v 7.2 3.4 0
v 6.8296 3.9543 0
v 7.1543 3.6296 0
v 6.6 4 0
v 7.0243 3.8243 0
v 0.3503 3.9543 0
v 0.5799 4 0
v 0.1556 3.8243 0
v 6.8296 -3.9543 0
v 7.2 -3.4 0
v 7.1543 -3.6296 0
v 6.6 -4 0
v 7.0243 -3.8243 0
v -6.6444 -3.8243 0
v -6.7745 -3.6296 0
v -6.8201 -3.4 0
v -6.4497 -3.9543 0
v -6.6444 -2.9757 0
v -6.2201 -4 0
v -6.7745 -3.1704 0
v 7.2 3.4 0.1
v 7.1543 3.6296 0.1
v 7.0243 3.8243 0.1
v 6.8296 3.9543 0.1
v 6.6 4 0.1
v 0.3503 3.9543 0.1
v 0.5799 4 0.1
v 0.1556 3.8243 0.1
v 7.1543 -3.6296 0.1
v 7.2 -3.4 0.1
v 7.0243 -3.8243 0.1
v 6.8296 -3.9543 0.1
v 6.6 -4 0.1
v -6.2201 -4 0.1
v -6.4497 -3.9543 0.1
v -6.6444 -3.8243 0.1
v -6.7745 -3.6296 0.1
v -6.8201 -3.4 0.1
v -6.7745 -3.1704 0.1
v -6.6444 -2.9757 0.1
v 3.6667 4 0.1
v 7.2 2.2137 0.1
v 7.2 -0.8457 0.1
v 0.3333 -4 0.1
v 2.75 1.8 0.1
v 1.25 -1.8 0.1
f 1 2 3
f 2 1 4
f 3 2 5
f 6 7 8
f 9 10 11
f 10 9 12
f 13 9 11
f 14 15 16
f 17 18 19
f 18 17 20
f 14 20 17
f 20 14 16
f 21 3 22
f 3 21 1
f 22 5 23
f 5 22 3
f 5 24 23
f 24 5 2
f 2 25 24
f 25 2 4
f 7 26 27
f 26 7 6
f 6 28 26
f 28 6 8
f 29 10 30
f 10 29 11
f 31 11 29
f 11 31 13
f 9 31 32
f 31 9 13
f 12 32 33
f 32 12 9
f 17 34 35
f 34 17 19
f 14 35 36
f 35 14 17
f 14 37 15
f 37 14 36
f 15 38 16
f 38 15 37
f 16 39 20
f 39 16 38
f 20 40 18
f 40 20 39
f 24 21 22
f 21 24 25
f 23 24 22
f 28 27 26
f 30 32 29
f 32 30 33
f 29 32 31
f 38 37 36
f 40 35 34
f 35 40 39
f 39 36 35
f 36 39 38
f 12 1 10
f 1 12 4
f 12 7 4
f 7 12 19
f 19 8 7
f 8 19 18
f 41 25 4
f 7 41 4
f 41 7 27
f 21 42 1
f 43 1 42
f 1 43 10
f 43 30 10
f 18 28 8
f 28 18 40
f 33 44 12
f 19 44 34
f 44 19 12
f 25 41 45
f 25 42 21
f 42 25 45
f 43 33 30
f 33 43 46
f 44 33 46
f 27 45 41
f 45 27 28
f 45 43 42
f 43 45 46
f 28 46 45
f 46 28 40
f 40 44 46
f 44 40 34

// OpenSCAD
// file: ../p/3-8cyli.scad
use <../lib.scad>
function ldraw_lib__3_8cyli() = [
// 0 Cylinder 0.375
// 0 Name: 3-8cyli.dat
// 0 Author: James Jessiman
// 0 !LDRAW_ORG Primitive UPDATE 2005-01
// 0 !LICENSE Licensed under CC BY 4.0 : see CAreadme.txt
// 
// 0 BFC CERTIFY CCW
  [0,"BFC","CERTIFY"],
  [0,"BFC","CCW"],
// 
// 0 !HISTORY 2002-05-08 [OrionP] Made BFC compliant
// 0 !HISTORY 2002-08-18 [PTadmin] Official Update 2002-04
// 0 !HISTORY 2004-12-11 [nielsk] Recreated using Primitive Generator, Edge lines fixed, BFC changed to CCW
// 0 !HISTORY 2005-12-28 [PTadmin] Official Update 2005-01
// 0 !HISTORY 2007-06-24 [PTadmin] Header formatted for Contributor Agreement
// 0 !HISTORY 2008-07-01 [PTadmin] Official Update 2008-01
// 
// 
// 4 16 .9239 1 .3827 .9239 0 .3827 1 0 0 1 1 0
  [4,16,.9239,1,.3827,.9239,0,.3827,1,0,0,1,1,0],
// 4 16 .7071 1 .7071 .7071 0 .7071 .9239 0 .3827 .9239 1 .3827
  [4,16,.7071,1,.7071,.7071,0,.7071,.9239,0,.3827,.9239,1,.3827],
// 4 16 .3827 1 .9239 .3827 0 .9239 .7071 0 .7071 .7071 1 .7071
  [4,16,.3827,1,.9239,.3827,0,.9239,.7071,0,.7071,.7071,1,.7071],
// 4 16 0 1 1 0 0 1 .3827 0 .9239 .3827 1 .9239
  [4,16,0,1,1,0,0,1,.3827,0,.9239,.3827,1,.9239],
// 4 16 -.3827 1 .9239 -.3827 0 .9239 0 0 1 0 1 1
  [4,16,-.3827,1,.9239,-.3827,0,.9239,0,0,1,0,1,1],
// 4 16 -.7071 1 .7071 -.7071 0 .7071 -.3827 0 .9239 -.3827 1 .9239
  [4,16,-.7071,1,.7071,-.7071,0,.7071,-.3827,0,.9239,-.3827,1,.9239],
// 5 24 1 1 0 1 0 0 1 1 -.4142 .9239 1 .3827
  [5,24,1,1,0,1,0,0,1,1,-.4142,.9239,1,.3827],
// 5 24 .9239 1 .3827 .9239 0 .3827 1 1 0 .7071 1 .7071
  [5,24,.9239,1,.3827,.9239,0,.3827,1,1,0,.7071,1,.7071],
// 5 24 .7071 1 .7071 .7071 0 .7071 .9239 1 .3827 .3827 1 .9239
  [5,24,.7071,1,.7071,.7071,0,.7071,.9239,1,.3827,.3827,1,.9239],
// 5 24 .3827 1 .9239 .3827 0 .9239 .7071 1 .7071 0 1 1
  [5,24,.3827,1,.9239,.3827,0,.9239,.7071,1,.7071,0,1,1],
// 5 24 0 1 1 0 0 1 .3827 1 .9239 -.3827 1 .9239
  [5,24,0,1,1,0,0,1,.3827,1,.9239,-.3827,1,.9239],
// 5 24 -.3827 1 .9239 -.3827 0 .9239 0 1 1 -.7071 1 .7071
  [5,24,-.3827,1,.9239,-.3827,0,.9239,0,1,1,-.7071,1,.7071],
// 5 24 -.7071 1 .7071 -.7071 0 .7071 -.3827 1 .9239 -1 1 .4142
  [5,24,-.7071,1,.7071,-.7071,0,.7071,-.3827,1,.9239,-1,1,.4142],
// 0
];
module ldraw_lib__3_8cyli(step=0, col=false, unit=2/5, alt=false, line=0.2, solid=!$preview)
    makepoly(ldraw_lib__3_8cyli(), step=step, col=col, unit=unit, alt=alt, line=line, solid=solid);
ldraw_lib__3_8cyli(line=0.2);
// file: ../p/3-8chrd.scad
use <../lib.scad>
function ldraw_lib__3_8chrd() = [
// 0 Chord 0.375
// 0 Name: 3-8chrd.dat
// 0 Author: Donald Sutter [technog]
// 0 !LDRAW_ORG Primitive UPDATE 2005-01
// 0 !LICENSE Licensed under CC BY 4.0 : see CAreadme.txt
// 
// 0 BFC CERTIFY CCW
  [0,"BFC","CERTIFY"],
  [0,"BFC","CCW"],
// 
// 0 !HISTORY 2004-01-07 [Steffen] added primitive code for POVray
// 0 !HISTORY 2004-03-18 [mkennedy] removed pov code and rearanged polygons.
// 0 !HISTORY 2004-09-12 [cwdee] reversed winding and standardised precision
// 0 !HISTORY 2005-12-28 [PTadmin] Official Update 2005-01
// 0 !HISTORY 2007-06-24 [PTadmin] Header formatted for Contributor Agreement
// 0 !HISTORY 2008-07-01 [PTadmin] Official Update 2008-01
// 
// 
// 3 16 0.7071 0 0.7071 0.3827 0 0.9239 0 0 1
  [3,16,0.7071,0,0.7071,0.3827,0,0.9239,0,0,1],
// 4 16 0.9239 0 0.3827 -0.3827 0 0.9239 -0.7071 0 0.7071 1 0 0
  [4,16,0.9239,0,0.3827,-0.3827,0,0.9239,-0.7071,0,0.7071,1,0,0],
// 4 16 0.7071 0 0.7071 0 0 1 -0.3827 0 0.9239 0.9239 0 0.3827
  [4,16,0.7071,0,0.7071,0,0,1,-0.3827,0,0.9239,0.9239,0,0.3827],
// 0
];
module ldraw_lib__3_8chrd(step=0, col=false, unit=2/5, alt=false, line=0.2, solid=!$preview)
    makepoly(ldraw_lib__3_8chrd(), step=step, col=col, unit=unit, alt=alt, line=line, solid=solid);
ldraw_lib__3_8chrd(line=0.2);
// file: ../p/1-8cyli.scad
use <../lib.scad>
function ldraw_lib__1_8cyli() = [
// 0 Cylinder 0.125
// 0 Name: 1-8cyli.dat
// 0 Author: James Jessiman
// 0 !LDRAW_ORG Primitive UPDATE 2005-01
// 0 !LICENSE Licensed under CC BY 4.0 : see CAreadme.txt
// 
// 0 BFC CERTIFY CCW
  [0,"BFC","CERTIFY"],
  [0,"BFC","CCW"],
// 
// 0 !HISTORY 2002-04-25 [PTadmin] Official Update 2002-02
// 0 !HISTORY 2004-12-11 [nielsk] Recreated using Primitive Generator, Edge lines fixed, BFC changed to CCW
// 0 !HISTORY 2005-12-28 [PTadmin] Official Update 2005-01
// 0 !HISTORY 2007-06-22 [PTadmin] Header formatted for Contributor Agreement
// 0 !HISTORY 2008-07-01 [PTadmin] Official Update 2008-01
// 
// 
// 4 16 .9239 1 .3827 .9239 0 .3827 1 0 0 1 1 0
  [4,16,.9239,1,.3827,.9239,0,.3827,1,0,0,1,1,0],
// 4 16 .7071 1 .7071 .7071 0 .7071 .9239 0 .3827 .9239 1 .3827
  [4,16,.7071,1,.7071,.7071,0,.7071,.9239,0,.3827,.9239,1,.3827],
// 5 24 1 1 0 1 0 0 1 1 -.4142 .9239 1 .3827
  [5,24,1,1,0,1,0,0,1,1,-.4142,.9239,1,.3827],
// 5 24 .9239 1 .3827 .9239 0 .3827 1 1 0 .7071 1 .7071
  [5,24,.9239,1,.3827,.9239,0,.3827,1,1,0,.7071,1,.7071],
// 5 24 .7071 1 .7071 .7071 0 .7071 .9239 1 .3827 .4142 1 1
  [5,24,.7071,1,.7071,.7071,0,.7071,.9239,1,.3827,.4142,1,1],
// 0
];
module ldraw_lib__1_8cyli(step=0, col=false, unit=2/5, alt=false, line=0.2, solid=!$preview)
    makepoly(ldraw_lib__1_8cyli(), step=step, col=col, unit=unit, alt=alt, line=line, solid=solid);
ldraw_lib__1_8cyli(line=0.2);
// file: ../p/1-8chrd.scad
use <../lib.scad>
function ldraw_lib__1_8chrd() = [
// 0 Chord 0.125
// 0 Name: 1-8chrd.dat
// 0 Author: Orion Pobursky [OrionP]
// 0 !LDRAW_ORG Primitive UPDATE 2023-05
// 0 !LICENSE Licensed under CC BY 4.0 : see CAreadme.txt
// 
// 0 BFC CERTIFY CCW
  [0,"BFC","CERTIFY"],
  [0,"BFC","CCW"],
// 
// 0 !HISTORY 2004-04-22 [PTadmin] Official Update 2004-02
// 0 !HISTORY 2007-06-22 [PTadmin] Header formatted for Contributor Agreement
// 0 !HISTORY 2008-07-01 [PTadmin] Official Update 2008-01
// 0 !HISTORY 2023-10-27 [OrionP] Rebuilt with PrimGen2, original author westrate
// 0 !HISTORY 2023-10-31 [OrionP] Official Update 2023-05
// 
// 3 16 1 0 0 0.9239 0 0.3827 0.7071 0 0.7071
  [3,16,1,0,0,0.9239,0,0.3827,0.7071,0,0.7071],
];
module ldraw_lib__1_8chrd(step=0, col=false, unit=2/5, alt=false, line=0.2, solid=!$preview)
    makepoly(ldraw_lib__1_8chrd(), step=step, col=col, unit=unit, alt=alt, line=line, solid=solid);
ldraw_lib__1_8chrd(line=0.2);
// file: ../p/1-4cyli.scad
use <../lib.scad>
function ldraw_lib__1_4cyli() = [
// 0 Cylinder 0.25
// 0 Name: 1-4cyli.dat
// 0 Author: James Jessiman
// 0 !LDRAW_ORG Primitive UPDATE 2012-01
// 0 !LICENSE Licensed under CC BY 4.0 : see CAreadme.txt
// 
// 0 BFC CERTIFY CCW
  [0,"BFC","CERTIFY"],
  [0,"BFC","CCW"],
// 
// 0 !HISTORY 2002-03-23 [sbliss] Added BFC statement.
// 0 !HISTORY 2002-04-25 [PTadmin] Official Update 2002-02
// 0 !HISTORY 2007-06-22 [PTadmin] Header formatted for Contributor Agreement
// 0 !HISTORY 2008-07-01 [PTadmin] Official Update 2008-01
// 0 !HISTORY 2012-02-16 [Philo] Changed to CCW
// 0 !HISTORY 2012-03-30 [PTadmin] Official Update 2012-01
// 
// 
// 4 16 1 1 0 0.9239 1 0.3827 0.9239 0 0.3827 1 0 0
  [4,16,1,1,0,0.9239,1,0.3827,0.9239,0,0.3827,1,0,0],
// 5 24 1 0 0 1 1 0 0.9239 0 0.3827 1 0 -1
  [5,24,1,0,0,1,1,0,0.9239,0,0.3827,1,0,-1],
// 4 16 0.9239 1 0.3827 0.7071 1 0.7071 0.7071 0 0.7071 0.9239 0 0.3827
  [4,16,0.9239,1,0.3827,0.7071,1,0.7071,0.7071,0,0.7071,0.9239,0,0.3827],
// 5 24 0.9239 0 0.3827 0.9239 1 0.3827 0.7071 0 0.7071 1 0 0
  [5,24,0.9239,0,0.3827,0.9239,1,0.3827,0.7071,0,0.7071,1,0,0],
// 4 16 0.7071 1 0.7071 0.3827 1 0.9239 0.3827 0 0.9239 0.7071 0 0.7071
  [4,16,0.7071,1,0.7071,0.3827,1,0.9239,0.3827,0,0.9239,0.7071,0,0.7071],
// 5 24 0.7071 0 0.7071 0.7071 1 0.7071 0.3827 0 0.9239 0.9239 0 0.3827
  [5,24,0.7071,0,0.7071,0.7071,1,0.7071,0.3827,0,0.9239,0.9239,0,0.3827],
// 4 16 0.3827 1 0.9239 0 1 1 0 0 1 0.3827 0 0.9239
  [4,16,0.3827,1,0.9239,0,1,1,0,0,1,0.3827,0,0.9239],
// 5 24 0.3827 0 0.9239 0.3827 1 0.9239 0 0 1 0.7071 0 0.7071
  [5,24,0.3827,0,0.9239,0.3827,1,0.9239,0,0,1,0.7071,0,0.7071],
// 5 24 0 0 1 0 1 1 0.3827 0 0.9239 -1 0 1
  [5,24,0,0,1,0,1,1,0.3827,0,0.9239,-1,0,1],
];
module ldraw_lib__1_4cyli(step=0, col=false, unit=2/5, alt=false, line=0.2, solid=!$preview)
    makepoly(ldraw_lib__1_4cyli(), step=step, col=col, unit=unit, alt=alt, line=line, solid=solid);
ldraw_lib__1_4cyli(line=0.2);
// file: ../p/1-4chrd.scad
use <../lib.scad>
function ldraw_lib__1_4chrd() = [
// 0 Chord 0.25
// 0 Name: 1-4chrd.dat
// 0 Author: Max Martin Richter [MMR1988]
// 0 !LDRAW_ORG Primitive UPDATE 2023-05
// 0 !LICENSE Licensed under CC BY 4.0 : see CAreadme.txt
// 
// 0 BFC CERTIFY CCW
  [0,"BFC","CERTIFY"],
  [0,"BFC","CCW"],
// 
// 0 !HISTORY 2004-04-22 [PTadmin] Official Update 2004-02
// 0 !HISTORY 2007-10-09 [PTadmin] Header formatted for Contributor Agreement
// 0 !HISTORY 2008-07-01 [PTadmin] Official Update 2008-01
// 0 !HISTORY 2012-08-02 [MMR1988] Re-creation with PrimGen2 and Rectifier
// 0 !HISTORY 2012-08-09 [PTadmin] Official Update 2012-02
// 0 !HISTORY 2023-10-27 [OrionP] Change author to MMR1988 from hafhead
// 0 !HISTORY 2023-10-31 [OrionP] Official Update 2023-05
// 
// 4 16 0.9239 0 0.3827 0.3827 0 0.9239 0 0 1 1 0 0
  [4,16,0.9239,0,0.3827,0.3827,0,0.9239,0,0,1,1,0,0],
// 3 16 0.7071 0 0.7071 0.3827 0 0.9239 0.9239 0 0.3827
  [3,16,0.7071,0,0.7071,0.3827,0,0.9239,0.9239,0,0.3827],
];
module ldraw_lib__1_4chrd(step=0, col=false, unit=2/5, alt=false, line=0.2, solid=!$preview)
    makepoly(ldraw_lib__1_4chrd(), step=step, col=col, unit=unit, alt=alt, line=line, solid=solid);
ldraw_lib__1_4chrd(line=0.2);
// file: 6148328aa.scad
use <../lib.scad>
use <../p/1-4chrd.scad>
use <../p/1-4cyli.scad>
use <../p/1-8chrd.scad>
use <../p/1-8cyli.scad>
use <../p/3-8chrd.scad>
use <../p/3-8cyli.scad>
function ldraw_lib__6148328aa() = [
// 0 Sticker  1.0 x  1.8 with Red Trapezoids on White Background Right
// 0 Name: 6148328aa.dat
// 0 Author: Massimo Maso [Sirio]
// 0 !LDRAW_ORG Part UPDATE 2024-01
// 0 !LICENSE Licensed under CC BY 4.0 : see CAreadme.txt
// 
// 0 BFC CERTIFY CCW
  [0,"BFC","CERTIFY"],
  [0,"BFC","CCW"],
// 
// 0 !KEYWORDS 917K, Bricklink 75876stk01, Brickowl 852010, Pit Lane, Porsche
// 0 !KEYWORDS Rebrickable 26357, set 75876, Speed Champions
// 
// 0 !HISTORY 2024-01-29 [OrionP] Official Update 2024-01
// 
// 
// 0 // Primitives
// 
// 1 16 -16.5 0 8.5 -1.5 0 0 0 -1 0 0 0 1.5 1-4chrd.dat
  [1,16,-16.5,0,8.5,-1.5,0,0,0,-1,0,0,0,1.5, ldraw_lib__1_4chrd()],
// 1 16 -1.4497 0 8.5 0 0 1.5 0 -1 0 1.5 0 0 1-8chrd.dat
  [1,16,-1.4497,0,8.5,0,0,1.5,0,-1,0,1.5,0,0, ldraw_lib__1_8chrd()],
// 1 16 -16.5 0 -8.5 -1.5 0 0 0 -1 0 0 0 -1.5 1-4chrd.dat
  [1,16,-16.5,0,-8.5,-1.5,0,0,0,-1,0,0,0,-1.5, ldraw_lib__1_4chrd()],
// 1 16 15.5503 0 -8.5 0 0 1.5 0 -1 0 -1.5 0 0 3-8chrd.dat
  [1,16,15.5503,0,-8.5,0,0,1.5,0,-1,0,-1.5,0,0, ldraw_lib__3_8chrd()],
// 1 16 -16.5 0 8.5 -1.5 0 0 0 -.25 0 0 0 1.5 1-4cyli.dat
  [1,16,-16.5,0,8.5,-1.5,0,0,0,-.25,0,0,0,1.5, ldraw_lib__1_4cyli()],
// 1 16 -1.4497 0 8.5 0 0 1.5 0 -.25 0 1.5 0 0 1-8cyli.dat
  [1,16,-1.4497,0,8.5,0,0,1.5,0,-.25,0,1.5,0,0, ldraw_lib__1_8cyli()],
// 1 16 -16.5 0 -8.5 -1.5 0 0 0 -.25 0 0 0 -1.5 1-4cyli.dat
  [1,16,-16.5,0,-8.5,-1.5,0,0,0,-.25,0,0,0,-1.5, ldraw_lib__1_4cyli()],
// 1 16 15.5503 0 -8.5 0 0 1.5 0 -.25 0 -1.5 0 0 3-8cyli.dat
  [1,16,15.5503,0,-8.5,0,0,1.5,0,-.25,0,-1.5,0,0, ldraw_lib__3_8cyli()],
// 1 4 -16.5 -.25 8.5 -1.5 0 0 0 1 0 0 0 1.5 1-4chrd.dat
  [1,4,-16.5,-.25,8.5,-1.5,0,0,0,1,0,0,0,1.5, ldraw_lib__1_4chrd()],
// 1 15 -1.4497 -.25 8.5 0 0 1.5 0 1 0 1.5 0 0 1-8chrd.dat
  [1,15,-1.4497,-.25,8.5,0,0,1.5,0,1,0,1.5,0,0, ldraw_lib__1_8chrd()],
// 1 4 -16.5 -.25 -8.5 -1.5 0 0 0 1 0 0 0 -1.5 1-4chrd.dat
  [1,4,-16.5,-.25,-8.5,-1.5,0,0,0,1,0,0,0,-1.5, ldraw_lib__1_4chrd()],
// 1 15 15.5503 -.25 -8.5 0 0 1.5 0 1 0 -1.5 0 0 3-8chrd.dat
  [1,15,15.5503,-.25,-8.5,0,0,1.5,0,1,0,-1.5,0,0, ldraw_lib__3_8chrd()],
// 0 // Bottom faces
// 4 16 -16.5 0 10 -16.5 0 -10 -18 0 -8.5 -18 0 8.5
  [4,16,-16.5,0,10,-16.5,0,-10,-18,0,-8.5,-18,0,8.5],
// 4 16 -16.5 0 10 -1.4497 0 10 15.5503 0 -10 -16.5 0 -10
  [4,16,-16.5,0,10,-1.4497,0,10,15.5503,0,-10,-16.5,0,-10],
// 4 16 -1.4497 0 10 -.38905 0 9.56065 16.61095 0 -7.43935 15.5503 0 -10
  [4,16,-1.4497,0,10,-.38905,0,9.56065,16.61095,0,-7.43935,15.5503,0,-10],
// 0 // Lateral faces
// 3 16 -16.5 0 10 -16.5 -.25 10 -9.1667 -.25 10
  [3,16,-16.5,0,10,-16.5,-.25,10,-9.1667,-.25,10],
// 4 16 -16.5 0 10 -9.1667 -.25 10 -1.4497 -.25 10 -1.4497 0 10
  [4,16,-16.5,0,10,-9.1667,-.25,10,-1.4497,-.25,10,-1.4497,0,10],
// 3 16 -18 0 8.5 -18 -.25 5.5343 -18 -.25 8.5
  [3,16,-18,0,8.5,-18,-.25,5.5343,-18,-.25,8.5],
// 4 16 -18 0 8.5 -18 0 -8.5 -18 -.25 -2.1143 -18 -.25 5.5343
  [4,16,-18,0,8.5,-18,0,-8.5,-18,-.25,-2.1143,-18,-.25,5.5343],
// 3 16 -18 0 -8.5 -18 -.25 -8.5 -18 -.25 -2.1143
  [3,16,-18,0,-8.5,-18,-.25,-8.5,-18,-.25,-2.1143],
// 4 16 -.38905 0 9.56065 -.38905 -.25 9.56065 16.61095 -.25 -7.43935 16.61095 0 -7.43935
  [4,16,-.38905,0,9.56065,-.38905,-.25,9.56065,16.61095,-.25,-7.43935,16.61095,0,-7.43935],
// 3 16 -16.5 0 -10 -.8333 -.25 -10 -16.5 -.25 -10
  [3,16,-16.5,0,-10,-.8333,-.25,-10,-16.5,-.25,-10],
// 4 16 -16.5 0 -10 15.5503 0 -10 15.5503 -.25 -10 -.8333 -.25 -10
  [4,16,-16.5,0,-10,15.5503,0,-10,15.5503,-.25,-10,-.8333,-.25,-10],
// 0 // Top faces
// 0 // Red faces
// 3 4 -6.875 -.25 4.5 -9.1667 -.25 10 -16.5 -.25 10
  [3,4,-6.875,-.25,4.5,-9.1667,-.25,10,-16.5,-.25,10],
// 4 4 -6.875 -.25 4.5 -16.5 -.25 10 -18 -.25 8.5 -18 -.25 5.5343
  [4,4,-6.875,-.25,4.5,-16.5,-.25,10,-18,-.25,8.5,-18,-.25,5.5343],
// 4 4 -3.125 -.25 -4.5 -18 -.25 -2.1143 -18 -.25 -8.5 -16.5 -.25 -10
  [4,4,-3.125,-.25,-4.5,-18,-.25,-2.1143,-18,-.25,-8.5,-16.5,-.25,-10],
// 3 4 -3.125 -.25 -4.5 -16.5 -.25 -10 -.8333 -.25 -10
  [3,4,-3.125,-.25,-4.5,-16.5,-.25,-10,-.8333,-.25,-10],
// 0 // White faces
// 4 15 -6.875 -.25 4.5 -.38905 -.25 9.56065 -1.4497 -.25 10 -9.1667 -.25 10
  [4,15,-6.875,-.25,4.5,-.38905,-.25,9.56065,-1.4497,-.25,10,-9.1667,-.25,10],
// 4 15 -6.875 -.25 4.5 -18 -.25 5.5343 -18 -.25 -2.1143 -3.125 -.25 -4.5
  [4,15,-6.875,-.25,4.5,-18,-.25,5.5343,-18,-.25,-2.1143,-3.125,-.25,-4.5],
// 4 15 -6.875 -.25 4.5 -3.125 -.25 -4.5 16.61095 -.25 -7.43935 -.38905 -.25 9.56065
  [4,15,-6.875,-.25,4.5,-3.125,-.25,-4.5,16.61095,-.25,-7.43935,-.38905,-.25,9.56065],
// 4 15 16.61095 -.25 -7.43935 -3.125 -.25 -4.5 -.8333 -.25 -10 15.5503 -.25 -10
  [4,15,16.61095,-.25,-7.43935,-3.125,-.25,-4.5,-.8333,-.25,-10,15.5503,-.25,-10],
];
module ldraw_lib__6148328aa(step=0, col=false, unit=2/5, alt=false, line=0.2, solid=!$preview)
    makepoly(ldraw_lib__6148328aa(), step=step, col=col, unit=unit, alt=alt, line=line, solid=solid);
ldraw_lib__6148328aa(line=0.2);
// main file
use <../lib.scad>
use <6148328aa.scad>
function ldraw_lib__6148328ab() = [
// 0 Sticker  1.0 x  1.8 with Red Trapezoids on White Background Left
// 0 Name: 6148328ab.dat
// 0 Author: Massimo Maso [Sirio]
// 0 !LDRAW_ORG Part UPDATE 2024-01
// 0 !LICENSE Licensed under CC BY 4.0 : see CAreadme.txt
// 
// 0 BFC CERTIFY CCW
  [0,"BFC","CERTIFY"],
  [0,"BFC","CCW"],
// 
// 0 !KEYWORDS 917K, Bricklink 75876stk01, Brickowl 852010, Pit Lane, Porsche
// 0 !KEYWORDS Rebrickable 26357, set 75876, Speed Champions
// 
// 0 !HISTORY 2024-01-29 [OrionP] Official Update 2024-01
// 
// 
// 1 16 0 0 0 -1 0 0 0 1 0 0 0 1 6148328aa.dat
  [1,16,0,0,0,-1,0,0,0,1,0,0,0,1, ldraw_lib__6148328aa()],
];
module ldraw_lib__6148328ab(step=0, col=false, unit=2/5, alt=false, line=0.2, solid=!$preview)
    makepoly(ldraw_lib__6148328ab(), step=step, col=col, unit=unit, alt=alt, line=line, solid=solid);
ldraw_lib__6148328ab(line=0.2);
